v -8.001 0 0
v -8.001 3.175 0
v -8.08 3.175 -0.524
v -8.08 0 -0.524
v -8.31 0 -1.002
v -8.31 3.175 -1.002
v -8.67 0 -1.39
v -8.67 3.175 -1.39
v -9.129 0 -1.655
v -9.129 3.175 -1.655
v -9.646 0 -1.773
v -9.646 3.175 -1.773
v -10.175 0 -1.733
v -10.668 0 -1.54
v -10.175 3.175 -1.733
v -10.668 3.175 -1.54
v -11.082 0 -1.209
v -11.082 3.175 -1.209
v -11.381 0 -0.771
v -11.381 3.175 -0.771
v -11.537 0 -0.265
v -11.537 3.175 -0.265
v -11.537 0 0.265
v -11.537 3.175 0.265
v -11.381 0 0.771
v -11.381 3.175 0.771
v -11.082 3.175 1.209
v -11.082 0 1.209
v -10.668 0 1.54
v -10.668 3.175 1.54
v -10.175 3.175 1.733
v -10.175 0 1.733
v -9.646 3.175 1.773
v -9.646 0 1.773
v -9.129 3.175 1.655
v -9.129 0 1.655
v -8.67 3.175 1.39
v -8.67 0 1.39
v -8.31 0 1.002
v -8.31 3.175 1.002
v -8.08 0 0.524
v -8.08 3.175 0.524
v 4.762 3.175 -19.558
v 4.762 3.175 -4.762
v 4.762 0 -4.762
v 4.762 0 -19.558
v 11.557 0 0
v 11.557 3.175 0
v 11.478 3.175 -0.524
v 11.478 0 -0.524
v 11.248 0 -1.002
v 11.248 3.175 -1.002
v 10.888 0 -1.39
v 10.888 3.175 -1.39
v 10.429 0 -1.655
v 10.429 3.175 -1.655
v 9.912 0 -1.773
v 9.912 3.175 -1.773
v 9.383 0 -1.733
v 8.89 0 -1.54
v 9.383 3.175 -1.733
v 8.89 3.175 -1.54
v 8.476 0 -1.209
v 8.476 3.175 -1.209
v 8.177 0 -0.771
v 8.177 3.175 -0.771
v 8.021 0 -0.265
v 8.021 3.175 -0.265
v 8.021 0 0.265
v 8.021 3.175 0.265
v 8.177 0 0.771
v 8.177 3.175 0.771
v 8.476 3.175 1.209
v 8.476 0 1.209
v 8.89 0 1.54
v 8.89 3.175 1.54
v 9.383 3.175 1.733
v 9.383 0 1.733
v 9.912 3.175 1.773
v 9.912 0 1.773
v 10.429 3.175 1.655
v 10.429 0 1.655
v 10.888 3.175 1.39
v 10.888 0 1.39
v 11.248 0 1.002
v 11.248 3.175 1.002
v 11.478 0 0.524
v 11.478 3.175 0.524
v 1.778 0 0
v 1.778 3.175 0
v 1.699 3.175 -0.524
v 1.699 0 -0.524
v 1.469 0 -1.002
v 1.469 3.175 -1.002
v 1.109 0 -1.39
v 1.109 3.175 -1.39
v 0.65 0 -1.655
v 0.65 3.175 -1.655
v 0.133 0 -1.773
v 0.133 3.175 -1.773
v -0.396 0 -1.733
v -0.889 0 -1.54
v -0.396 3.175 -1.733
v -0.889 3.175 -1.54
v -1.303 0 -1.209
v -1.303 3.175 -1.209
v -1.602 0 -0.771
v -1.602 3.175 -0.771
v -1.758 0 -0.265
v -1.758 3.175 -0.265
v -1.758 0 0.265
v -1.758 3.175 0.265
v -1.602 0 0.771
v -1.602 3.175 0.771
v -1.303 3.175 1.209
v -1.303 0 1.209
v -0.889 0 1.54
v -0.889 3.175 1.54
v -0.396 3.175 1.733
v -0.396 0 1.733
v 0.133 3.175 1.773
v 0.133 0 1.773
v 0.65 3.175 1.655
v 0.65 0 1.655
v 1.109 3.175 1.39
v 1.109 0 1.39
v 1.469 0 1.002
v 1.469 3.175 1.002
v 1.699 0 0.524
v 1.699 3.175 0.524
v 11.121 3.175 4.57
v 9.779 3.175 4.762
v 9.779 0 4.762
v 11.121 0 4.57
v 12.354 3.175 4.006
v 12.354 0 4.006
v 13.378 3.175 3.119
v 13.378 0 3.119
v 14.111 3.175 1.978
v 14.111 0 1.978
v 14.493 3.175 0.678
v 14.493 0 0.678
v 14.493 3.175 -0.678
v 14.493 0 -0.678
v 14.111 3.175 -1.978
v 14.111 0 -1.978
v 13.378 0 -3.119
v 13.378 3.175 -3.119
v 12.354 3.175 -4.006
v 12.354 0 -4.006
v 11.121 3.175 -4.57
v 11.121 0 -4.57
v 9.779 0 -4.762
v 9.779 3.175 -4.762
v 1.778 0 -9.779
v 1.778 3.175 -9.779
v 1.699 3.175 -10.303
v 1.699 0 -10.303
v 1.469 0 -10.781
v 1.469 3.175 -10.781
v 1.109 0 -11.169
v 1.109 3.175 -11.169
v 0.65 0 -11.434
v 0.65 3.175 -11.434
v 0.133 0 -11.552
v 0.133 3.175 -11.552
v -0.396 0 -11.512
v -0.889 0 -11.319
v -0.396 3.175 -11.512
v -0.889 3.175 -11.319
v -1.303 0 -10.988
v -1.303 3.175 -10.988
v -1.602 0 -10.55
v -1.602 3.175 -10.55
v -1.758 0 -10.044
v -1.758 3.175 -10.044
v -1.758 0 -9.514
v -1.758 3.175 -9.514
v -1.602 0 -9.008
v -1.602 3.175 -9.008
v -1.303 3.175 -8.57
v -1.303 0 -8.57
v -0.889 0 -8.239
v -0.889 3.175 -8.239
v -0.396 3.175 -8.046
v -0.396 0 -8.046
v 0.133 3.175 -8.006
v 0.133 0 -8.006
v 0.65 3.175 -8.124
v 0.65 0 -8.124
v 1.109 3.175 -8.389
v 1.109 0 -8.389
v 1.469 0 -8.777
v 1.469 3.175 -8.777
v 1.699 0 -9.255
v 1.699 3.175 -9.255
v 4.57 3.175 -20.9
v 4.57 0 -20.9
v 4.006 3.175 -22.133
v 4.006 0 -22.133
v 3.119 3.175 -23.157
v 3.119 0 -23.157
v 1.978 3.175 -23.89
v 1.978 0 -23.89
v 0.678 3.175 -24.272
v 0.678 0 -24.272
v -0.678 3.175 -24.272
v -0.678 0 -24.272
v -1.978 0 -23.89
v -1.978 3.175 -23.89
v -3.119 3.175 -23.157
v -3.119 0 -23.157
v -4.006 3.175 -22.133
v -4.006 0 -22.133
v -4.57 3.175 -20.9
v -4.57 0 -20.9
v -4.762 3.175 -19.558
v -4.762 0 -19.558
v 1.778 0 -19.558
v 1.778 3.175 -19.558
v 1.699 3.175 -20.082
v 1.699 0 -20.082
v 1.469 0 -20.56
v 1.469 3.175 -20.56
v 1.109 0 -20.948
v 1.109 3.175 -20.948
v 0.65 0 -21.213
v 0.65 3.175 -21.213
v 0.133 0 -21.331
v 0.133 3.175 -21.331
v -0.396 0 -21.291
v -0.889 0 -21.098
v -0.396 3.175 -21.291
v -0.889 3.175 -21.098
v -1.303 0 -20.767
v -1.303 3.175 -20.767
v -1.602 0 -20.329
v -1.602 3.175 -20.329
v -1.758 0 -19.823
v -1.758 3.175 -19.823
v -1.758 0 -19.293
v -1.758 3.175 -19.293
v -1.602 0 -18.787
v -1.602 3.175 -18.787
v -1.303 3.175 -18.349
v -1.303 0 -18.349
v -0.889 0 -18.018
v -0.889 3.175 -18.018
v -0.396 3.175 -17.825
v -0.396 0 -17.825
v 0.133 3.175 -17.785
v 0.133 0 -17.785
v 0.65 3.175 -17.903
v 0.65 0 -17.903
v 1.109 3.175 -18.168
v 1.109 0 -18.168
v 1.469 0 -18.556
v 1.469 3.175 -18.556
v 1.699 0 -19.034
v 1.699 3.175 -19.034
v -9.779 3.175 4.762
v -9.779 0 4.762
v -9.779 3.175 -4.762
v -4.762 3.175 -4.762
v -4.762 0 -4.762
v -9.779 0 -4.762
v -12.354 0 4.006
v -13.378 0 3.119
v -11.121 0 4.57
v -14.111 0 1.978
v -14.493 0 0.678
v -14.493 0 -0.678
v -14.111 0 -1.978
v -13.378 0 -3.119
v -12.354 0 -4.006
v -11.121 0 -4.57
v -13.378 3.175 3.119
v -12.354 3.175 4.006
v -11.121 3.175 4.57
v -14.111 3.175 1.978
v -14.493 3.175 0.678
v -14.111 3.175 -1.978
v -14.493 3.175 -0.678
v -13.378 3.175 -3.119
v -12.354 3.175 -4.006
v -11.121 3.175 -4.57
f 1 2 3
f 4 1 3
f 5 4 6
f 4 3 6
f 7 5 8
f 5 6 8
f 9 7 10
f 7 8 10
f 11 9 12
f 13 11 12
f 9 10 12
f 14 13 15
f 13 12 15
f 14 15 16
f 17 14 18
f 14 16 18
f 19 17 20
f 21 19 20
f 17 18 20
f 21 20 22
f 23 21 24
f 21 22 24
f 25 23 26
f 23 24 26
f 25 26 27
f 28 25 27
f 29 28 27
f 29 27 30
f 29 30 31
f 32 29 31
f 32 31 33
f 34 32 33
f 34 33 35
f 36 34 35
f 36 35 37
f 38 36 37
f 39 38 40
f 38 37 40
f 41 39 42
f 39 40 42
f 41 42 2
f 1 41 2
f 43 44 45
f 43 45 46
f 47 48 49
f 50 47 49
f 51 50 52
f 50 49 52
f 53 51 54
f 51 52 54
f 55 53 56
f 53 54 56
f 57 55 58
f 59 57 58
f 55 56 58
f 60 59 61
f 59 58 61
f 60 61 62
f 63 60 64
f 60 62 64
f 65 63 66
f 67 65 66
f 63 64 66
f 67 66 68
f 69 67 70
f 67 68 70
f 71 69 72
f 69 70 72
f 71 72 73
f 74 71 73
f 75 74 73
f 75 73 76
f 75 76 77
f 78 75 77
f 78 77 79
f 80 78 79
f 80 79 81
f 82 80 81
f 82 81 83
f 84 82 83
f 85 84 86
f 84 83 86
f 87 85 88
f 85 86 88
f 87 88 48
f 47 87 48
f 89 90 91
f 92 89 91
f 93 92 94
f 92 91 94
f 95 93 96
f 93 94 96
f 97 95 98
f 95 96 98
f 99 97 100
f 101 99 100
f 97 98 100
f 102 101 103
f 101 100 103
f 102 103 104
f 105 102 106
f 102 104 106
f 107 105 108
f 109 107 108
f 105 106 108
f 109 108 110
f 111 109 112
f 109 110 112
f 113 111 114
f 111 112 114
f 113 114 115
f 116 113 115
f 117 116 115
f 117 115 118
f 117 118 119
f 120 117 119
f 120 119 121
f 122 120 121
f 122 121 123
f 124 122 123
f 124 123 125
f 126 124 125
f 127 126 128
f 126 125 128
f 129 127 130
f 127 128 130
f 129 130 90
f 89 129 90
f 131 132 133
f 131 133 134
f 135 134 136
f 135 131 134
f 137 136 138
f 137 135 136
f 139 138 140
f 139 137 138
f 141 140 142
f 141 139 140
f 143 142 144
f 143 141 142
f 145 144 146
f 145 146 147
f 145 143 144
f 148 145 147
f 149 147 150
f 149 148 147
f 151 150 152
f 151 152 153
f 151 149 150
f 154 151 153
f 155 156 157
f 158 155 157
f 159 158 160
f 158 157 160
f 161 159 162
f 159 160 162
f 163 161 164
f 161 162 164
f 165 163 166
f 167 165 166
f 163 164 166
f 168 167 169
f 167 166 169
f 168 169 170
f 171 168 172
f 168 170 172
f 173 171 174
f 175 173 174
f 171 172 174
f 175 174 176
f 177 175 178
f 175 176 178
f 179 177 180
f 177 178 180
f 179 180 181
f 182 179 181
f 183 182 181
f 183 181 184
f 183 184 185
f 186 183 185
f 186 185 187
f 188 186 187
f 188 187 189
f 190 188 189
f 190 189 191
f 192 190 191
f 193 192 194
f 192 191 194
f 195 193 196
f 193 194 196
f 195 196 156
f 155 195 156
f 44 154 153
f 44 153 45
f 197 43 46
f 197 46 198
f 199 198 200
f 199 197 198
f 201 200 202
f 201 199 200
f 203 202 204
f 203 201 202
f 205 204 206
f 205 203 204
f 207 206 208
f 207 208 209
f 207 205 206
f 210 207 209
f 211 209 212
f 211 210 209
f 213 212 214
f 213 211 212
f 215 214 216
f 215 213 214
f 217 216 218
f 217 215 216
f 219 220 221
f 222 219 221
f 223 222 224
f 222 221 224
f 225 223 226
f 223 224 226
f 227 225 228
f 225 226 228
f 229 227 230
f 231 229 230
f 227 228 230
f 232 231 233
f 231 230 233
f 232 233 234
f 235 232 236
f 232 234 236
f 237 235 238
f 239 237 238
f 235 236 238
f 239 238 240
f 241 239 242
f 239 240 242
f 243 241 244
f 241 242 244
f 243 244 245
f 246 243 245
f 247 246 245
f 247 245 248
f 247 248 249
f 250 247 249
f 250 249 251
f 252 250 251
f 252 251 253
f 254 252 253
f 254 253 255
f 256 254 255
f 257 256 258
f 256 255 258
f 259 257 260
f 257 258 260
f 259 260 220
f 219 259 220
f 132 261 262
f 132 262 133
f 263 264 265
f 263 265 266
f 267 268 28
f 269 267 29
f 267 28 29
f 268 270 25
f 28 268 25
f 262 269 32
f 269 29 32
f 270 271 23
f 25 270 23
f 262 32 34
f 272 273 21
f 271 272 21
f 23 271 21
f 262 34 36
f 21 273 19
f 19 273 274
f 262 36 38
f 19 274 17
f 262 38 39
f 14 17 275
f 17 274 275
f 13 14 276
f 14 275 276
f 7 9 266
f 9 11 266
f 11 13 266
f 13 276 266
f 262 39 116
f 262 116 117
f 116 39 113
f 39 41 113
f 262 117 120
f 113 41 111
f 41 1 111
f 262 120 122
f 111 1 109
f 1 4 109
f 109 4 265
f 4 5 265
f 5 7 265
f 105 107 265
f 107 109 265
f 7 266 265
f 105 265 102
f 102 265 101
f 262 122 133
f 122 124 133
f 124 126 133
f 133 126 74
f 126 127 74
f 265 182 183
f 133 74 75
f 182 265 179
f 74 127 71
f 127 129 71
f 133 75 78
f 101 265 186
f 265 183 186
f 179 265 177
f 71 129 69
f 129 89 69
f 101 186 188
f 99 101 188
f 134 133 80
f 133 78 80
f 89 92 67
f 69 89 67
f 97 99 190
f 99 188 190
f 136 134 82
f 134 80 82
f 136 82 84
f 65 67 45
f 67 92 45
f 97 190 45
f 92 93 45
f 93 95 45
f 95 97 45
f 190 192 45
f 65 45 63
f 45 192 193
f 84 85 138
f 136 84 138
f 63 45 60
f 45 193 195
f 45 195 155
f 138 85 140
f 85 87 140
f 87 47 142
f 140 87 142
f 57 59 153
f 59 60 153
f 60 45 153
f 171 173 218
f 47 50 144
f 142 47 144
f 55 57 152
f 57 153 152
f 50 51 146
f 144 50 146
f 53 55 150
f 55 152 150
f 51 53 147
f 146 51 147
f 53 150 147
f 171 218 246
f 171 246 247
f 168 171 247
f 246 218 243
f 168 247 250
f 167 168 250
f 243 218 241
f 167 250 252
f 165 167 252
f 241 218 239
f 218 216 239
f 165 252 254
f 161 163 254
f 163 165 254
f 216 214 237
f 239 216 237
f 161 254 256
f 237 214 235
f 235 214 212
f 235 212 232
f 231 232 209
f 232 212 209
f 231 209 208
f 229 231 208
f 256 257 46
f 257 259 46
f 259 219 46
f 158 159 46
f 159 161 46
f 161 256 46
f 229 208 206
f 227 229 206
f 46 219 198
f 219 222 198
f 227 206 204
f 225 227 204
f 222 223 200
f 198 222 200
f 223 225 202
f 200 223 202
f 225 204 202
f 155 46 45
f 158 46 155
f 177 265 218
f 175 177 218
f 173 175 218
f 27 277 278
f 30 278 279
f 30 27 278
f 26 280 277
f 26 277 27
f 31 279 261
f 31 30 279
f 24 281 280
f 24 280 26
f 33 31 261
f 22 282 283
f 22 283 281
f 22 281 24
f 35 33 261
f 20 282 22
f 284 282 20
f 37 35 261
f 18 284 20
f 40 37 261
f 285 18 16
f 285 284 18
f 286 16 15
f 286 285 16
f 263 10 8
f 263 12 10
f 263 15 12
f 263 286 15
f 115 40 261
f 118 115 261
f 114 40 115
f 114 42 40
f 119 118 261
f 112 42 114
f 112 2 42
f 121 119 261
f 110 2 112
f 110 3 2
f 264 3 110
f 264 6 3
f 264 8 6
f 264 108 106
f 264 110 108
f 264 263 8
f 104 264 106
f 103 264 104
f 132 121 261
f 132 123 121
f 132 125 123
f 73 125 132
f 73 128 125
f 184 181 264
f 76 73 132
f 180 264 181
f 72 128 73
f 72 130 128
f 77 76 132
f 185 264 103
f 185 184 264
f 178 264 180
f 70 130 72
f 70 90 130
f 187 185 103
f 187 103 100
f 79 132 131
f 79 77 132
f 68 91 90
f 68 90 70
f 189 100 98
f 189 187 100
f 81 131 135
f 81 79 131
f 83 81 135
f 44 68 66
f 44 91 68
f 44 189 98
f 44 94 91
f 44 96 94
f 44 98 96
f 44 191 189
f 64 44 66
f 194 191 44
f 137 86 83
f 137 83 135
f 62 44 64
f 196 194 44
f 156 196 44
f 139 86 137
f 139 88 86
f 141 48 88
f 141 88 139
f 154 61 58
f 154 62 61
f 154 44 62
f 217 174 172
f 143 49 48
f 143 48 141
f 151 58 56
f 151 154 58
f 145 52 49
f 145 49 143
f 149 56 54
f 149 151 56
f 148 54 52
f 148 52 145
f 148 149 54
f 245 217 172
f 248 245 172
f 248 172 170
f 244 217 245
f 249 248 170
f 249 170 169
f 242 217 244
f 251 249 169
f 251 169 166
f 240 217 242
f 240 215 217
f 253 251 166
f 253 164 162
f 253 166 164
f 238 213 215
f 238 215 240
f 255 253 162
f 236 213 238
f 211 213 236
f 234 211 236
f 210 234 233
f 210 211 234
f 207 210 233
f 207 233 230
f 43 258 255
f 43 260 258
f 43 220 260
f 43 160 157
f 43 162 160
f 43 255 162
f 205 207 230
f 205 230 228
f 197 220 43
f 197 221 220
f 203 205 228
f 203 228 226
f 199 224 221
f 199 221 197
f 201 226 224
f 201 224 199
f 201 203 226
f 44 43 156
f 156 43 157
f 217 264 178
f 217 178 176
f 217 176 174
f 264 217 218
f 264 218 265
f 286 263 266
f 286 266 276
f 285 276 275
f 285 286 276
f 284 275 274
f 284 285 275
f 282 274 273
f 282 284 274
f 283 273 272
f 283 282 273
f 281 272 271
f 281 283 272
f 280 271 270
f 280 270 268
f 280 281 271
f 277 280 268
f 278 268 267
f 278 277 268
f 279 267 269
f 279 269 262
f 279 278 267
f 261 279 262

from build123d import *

# Parameters (mm, degrees)
SKETCH1_R           = 1.778
BOSS_EXTRUDE1_DEPTH = 3.175


with BuildPart() as part:
    # Sketch1 → Boss-Extrude1 (new body)
    with BuildSketch(Plane(origin=(0, 3.175, 0), x_dir=(1, 0, 0), z_dir=(0, 1, 0))):
        with BuildLine():
            Line((4.7625, 4.7625), (4.7625, 19.558))
            ThreePointArc((4.7625, 19.558), (0, 24.3205), (-4.7625, 19.558))
            Line((-4.7625, 19.558), (-4.7625, 4.7625))
            Line((-4.7625, 4.7625), (-9.779, 4.7625))
            ThreePointArc((-9.779, 4.7625), (-14.5415, 0), (-9.779, -4.7625))
            Line((-9.779, -4.7625), (9.779, -4.7625))
            ThreePointArc((9.779, -4.7625), (14.5415, 0), (9.779, 4.7625))
            Line((9.779, 4.7625), (4.7625, 4.7625))
        make_face()
        with Locations((0, 19.558)):
            Circle(SKETCH1_R, mode=Mode.SUBTRACT)
        with Locations((9.779, 0)):
            Circle(SKETCH1_R, mode=Mode.SUBTRACT)
        with Locations((0, 9.779)):
            Circle(SKETCH1_R, mode=Mode.SUBTRACT)
        with Locations((-9.779, 0)):
            Circle(SKETCH1_R, mode=Mode.SUBTRACT)
        Circle(SKETCH1_R, mode=Mode.SUBTRACT)
    extrude(amount=-BOSS_EXTRUDE1_DEPTH)


solid = part.part
